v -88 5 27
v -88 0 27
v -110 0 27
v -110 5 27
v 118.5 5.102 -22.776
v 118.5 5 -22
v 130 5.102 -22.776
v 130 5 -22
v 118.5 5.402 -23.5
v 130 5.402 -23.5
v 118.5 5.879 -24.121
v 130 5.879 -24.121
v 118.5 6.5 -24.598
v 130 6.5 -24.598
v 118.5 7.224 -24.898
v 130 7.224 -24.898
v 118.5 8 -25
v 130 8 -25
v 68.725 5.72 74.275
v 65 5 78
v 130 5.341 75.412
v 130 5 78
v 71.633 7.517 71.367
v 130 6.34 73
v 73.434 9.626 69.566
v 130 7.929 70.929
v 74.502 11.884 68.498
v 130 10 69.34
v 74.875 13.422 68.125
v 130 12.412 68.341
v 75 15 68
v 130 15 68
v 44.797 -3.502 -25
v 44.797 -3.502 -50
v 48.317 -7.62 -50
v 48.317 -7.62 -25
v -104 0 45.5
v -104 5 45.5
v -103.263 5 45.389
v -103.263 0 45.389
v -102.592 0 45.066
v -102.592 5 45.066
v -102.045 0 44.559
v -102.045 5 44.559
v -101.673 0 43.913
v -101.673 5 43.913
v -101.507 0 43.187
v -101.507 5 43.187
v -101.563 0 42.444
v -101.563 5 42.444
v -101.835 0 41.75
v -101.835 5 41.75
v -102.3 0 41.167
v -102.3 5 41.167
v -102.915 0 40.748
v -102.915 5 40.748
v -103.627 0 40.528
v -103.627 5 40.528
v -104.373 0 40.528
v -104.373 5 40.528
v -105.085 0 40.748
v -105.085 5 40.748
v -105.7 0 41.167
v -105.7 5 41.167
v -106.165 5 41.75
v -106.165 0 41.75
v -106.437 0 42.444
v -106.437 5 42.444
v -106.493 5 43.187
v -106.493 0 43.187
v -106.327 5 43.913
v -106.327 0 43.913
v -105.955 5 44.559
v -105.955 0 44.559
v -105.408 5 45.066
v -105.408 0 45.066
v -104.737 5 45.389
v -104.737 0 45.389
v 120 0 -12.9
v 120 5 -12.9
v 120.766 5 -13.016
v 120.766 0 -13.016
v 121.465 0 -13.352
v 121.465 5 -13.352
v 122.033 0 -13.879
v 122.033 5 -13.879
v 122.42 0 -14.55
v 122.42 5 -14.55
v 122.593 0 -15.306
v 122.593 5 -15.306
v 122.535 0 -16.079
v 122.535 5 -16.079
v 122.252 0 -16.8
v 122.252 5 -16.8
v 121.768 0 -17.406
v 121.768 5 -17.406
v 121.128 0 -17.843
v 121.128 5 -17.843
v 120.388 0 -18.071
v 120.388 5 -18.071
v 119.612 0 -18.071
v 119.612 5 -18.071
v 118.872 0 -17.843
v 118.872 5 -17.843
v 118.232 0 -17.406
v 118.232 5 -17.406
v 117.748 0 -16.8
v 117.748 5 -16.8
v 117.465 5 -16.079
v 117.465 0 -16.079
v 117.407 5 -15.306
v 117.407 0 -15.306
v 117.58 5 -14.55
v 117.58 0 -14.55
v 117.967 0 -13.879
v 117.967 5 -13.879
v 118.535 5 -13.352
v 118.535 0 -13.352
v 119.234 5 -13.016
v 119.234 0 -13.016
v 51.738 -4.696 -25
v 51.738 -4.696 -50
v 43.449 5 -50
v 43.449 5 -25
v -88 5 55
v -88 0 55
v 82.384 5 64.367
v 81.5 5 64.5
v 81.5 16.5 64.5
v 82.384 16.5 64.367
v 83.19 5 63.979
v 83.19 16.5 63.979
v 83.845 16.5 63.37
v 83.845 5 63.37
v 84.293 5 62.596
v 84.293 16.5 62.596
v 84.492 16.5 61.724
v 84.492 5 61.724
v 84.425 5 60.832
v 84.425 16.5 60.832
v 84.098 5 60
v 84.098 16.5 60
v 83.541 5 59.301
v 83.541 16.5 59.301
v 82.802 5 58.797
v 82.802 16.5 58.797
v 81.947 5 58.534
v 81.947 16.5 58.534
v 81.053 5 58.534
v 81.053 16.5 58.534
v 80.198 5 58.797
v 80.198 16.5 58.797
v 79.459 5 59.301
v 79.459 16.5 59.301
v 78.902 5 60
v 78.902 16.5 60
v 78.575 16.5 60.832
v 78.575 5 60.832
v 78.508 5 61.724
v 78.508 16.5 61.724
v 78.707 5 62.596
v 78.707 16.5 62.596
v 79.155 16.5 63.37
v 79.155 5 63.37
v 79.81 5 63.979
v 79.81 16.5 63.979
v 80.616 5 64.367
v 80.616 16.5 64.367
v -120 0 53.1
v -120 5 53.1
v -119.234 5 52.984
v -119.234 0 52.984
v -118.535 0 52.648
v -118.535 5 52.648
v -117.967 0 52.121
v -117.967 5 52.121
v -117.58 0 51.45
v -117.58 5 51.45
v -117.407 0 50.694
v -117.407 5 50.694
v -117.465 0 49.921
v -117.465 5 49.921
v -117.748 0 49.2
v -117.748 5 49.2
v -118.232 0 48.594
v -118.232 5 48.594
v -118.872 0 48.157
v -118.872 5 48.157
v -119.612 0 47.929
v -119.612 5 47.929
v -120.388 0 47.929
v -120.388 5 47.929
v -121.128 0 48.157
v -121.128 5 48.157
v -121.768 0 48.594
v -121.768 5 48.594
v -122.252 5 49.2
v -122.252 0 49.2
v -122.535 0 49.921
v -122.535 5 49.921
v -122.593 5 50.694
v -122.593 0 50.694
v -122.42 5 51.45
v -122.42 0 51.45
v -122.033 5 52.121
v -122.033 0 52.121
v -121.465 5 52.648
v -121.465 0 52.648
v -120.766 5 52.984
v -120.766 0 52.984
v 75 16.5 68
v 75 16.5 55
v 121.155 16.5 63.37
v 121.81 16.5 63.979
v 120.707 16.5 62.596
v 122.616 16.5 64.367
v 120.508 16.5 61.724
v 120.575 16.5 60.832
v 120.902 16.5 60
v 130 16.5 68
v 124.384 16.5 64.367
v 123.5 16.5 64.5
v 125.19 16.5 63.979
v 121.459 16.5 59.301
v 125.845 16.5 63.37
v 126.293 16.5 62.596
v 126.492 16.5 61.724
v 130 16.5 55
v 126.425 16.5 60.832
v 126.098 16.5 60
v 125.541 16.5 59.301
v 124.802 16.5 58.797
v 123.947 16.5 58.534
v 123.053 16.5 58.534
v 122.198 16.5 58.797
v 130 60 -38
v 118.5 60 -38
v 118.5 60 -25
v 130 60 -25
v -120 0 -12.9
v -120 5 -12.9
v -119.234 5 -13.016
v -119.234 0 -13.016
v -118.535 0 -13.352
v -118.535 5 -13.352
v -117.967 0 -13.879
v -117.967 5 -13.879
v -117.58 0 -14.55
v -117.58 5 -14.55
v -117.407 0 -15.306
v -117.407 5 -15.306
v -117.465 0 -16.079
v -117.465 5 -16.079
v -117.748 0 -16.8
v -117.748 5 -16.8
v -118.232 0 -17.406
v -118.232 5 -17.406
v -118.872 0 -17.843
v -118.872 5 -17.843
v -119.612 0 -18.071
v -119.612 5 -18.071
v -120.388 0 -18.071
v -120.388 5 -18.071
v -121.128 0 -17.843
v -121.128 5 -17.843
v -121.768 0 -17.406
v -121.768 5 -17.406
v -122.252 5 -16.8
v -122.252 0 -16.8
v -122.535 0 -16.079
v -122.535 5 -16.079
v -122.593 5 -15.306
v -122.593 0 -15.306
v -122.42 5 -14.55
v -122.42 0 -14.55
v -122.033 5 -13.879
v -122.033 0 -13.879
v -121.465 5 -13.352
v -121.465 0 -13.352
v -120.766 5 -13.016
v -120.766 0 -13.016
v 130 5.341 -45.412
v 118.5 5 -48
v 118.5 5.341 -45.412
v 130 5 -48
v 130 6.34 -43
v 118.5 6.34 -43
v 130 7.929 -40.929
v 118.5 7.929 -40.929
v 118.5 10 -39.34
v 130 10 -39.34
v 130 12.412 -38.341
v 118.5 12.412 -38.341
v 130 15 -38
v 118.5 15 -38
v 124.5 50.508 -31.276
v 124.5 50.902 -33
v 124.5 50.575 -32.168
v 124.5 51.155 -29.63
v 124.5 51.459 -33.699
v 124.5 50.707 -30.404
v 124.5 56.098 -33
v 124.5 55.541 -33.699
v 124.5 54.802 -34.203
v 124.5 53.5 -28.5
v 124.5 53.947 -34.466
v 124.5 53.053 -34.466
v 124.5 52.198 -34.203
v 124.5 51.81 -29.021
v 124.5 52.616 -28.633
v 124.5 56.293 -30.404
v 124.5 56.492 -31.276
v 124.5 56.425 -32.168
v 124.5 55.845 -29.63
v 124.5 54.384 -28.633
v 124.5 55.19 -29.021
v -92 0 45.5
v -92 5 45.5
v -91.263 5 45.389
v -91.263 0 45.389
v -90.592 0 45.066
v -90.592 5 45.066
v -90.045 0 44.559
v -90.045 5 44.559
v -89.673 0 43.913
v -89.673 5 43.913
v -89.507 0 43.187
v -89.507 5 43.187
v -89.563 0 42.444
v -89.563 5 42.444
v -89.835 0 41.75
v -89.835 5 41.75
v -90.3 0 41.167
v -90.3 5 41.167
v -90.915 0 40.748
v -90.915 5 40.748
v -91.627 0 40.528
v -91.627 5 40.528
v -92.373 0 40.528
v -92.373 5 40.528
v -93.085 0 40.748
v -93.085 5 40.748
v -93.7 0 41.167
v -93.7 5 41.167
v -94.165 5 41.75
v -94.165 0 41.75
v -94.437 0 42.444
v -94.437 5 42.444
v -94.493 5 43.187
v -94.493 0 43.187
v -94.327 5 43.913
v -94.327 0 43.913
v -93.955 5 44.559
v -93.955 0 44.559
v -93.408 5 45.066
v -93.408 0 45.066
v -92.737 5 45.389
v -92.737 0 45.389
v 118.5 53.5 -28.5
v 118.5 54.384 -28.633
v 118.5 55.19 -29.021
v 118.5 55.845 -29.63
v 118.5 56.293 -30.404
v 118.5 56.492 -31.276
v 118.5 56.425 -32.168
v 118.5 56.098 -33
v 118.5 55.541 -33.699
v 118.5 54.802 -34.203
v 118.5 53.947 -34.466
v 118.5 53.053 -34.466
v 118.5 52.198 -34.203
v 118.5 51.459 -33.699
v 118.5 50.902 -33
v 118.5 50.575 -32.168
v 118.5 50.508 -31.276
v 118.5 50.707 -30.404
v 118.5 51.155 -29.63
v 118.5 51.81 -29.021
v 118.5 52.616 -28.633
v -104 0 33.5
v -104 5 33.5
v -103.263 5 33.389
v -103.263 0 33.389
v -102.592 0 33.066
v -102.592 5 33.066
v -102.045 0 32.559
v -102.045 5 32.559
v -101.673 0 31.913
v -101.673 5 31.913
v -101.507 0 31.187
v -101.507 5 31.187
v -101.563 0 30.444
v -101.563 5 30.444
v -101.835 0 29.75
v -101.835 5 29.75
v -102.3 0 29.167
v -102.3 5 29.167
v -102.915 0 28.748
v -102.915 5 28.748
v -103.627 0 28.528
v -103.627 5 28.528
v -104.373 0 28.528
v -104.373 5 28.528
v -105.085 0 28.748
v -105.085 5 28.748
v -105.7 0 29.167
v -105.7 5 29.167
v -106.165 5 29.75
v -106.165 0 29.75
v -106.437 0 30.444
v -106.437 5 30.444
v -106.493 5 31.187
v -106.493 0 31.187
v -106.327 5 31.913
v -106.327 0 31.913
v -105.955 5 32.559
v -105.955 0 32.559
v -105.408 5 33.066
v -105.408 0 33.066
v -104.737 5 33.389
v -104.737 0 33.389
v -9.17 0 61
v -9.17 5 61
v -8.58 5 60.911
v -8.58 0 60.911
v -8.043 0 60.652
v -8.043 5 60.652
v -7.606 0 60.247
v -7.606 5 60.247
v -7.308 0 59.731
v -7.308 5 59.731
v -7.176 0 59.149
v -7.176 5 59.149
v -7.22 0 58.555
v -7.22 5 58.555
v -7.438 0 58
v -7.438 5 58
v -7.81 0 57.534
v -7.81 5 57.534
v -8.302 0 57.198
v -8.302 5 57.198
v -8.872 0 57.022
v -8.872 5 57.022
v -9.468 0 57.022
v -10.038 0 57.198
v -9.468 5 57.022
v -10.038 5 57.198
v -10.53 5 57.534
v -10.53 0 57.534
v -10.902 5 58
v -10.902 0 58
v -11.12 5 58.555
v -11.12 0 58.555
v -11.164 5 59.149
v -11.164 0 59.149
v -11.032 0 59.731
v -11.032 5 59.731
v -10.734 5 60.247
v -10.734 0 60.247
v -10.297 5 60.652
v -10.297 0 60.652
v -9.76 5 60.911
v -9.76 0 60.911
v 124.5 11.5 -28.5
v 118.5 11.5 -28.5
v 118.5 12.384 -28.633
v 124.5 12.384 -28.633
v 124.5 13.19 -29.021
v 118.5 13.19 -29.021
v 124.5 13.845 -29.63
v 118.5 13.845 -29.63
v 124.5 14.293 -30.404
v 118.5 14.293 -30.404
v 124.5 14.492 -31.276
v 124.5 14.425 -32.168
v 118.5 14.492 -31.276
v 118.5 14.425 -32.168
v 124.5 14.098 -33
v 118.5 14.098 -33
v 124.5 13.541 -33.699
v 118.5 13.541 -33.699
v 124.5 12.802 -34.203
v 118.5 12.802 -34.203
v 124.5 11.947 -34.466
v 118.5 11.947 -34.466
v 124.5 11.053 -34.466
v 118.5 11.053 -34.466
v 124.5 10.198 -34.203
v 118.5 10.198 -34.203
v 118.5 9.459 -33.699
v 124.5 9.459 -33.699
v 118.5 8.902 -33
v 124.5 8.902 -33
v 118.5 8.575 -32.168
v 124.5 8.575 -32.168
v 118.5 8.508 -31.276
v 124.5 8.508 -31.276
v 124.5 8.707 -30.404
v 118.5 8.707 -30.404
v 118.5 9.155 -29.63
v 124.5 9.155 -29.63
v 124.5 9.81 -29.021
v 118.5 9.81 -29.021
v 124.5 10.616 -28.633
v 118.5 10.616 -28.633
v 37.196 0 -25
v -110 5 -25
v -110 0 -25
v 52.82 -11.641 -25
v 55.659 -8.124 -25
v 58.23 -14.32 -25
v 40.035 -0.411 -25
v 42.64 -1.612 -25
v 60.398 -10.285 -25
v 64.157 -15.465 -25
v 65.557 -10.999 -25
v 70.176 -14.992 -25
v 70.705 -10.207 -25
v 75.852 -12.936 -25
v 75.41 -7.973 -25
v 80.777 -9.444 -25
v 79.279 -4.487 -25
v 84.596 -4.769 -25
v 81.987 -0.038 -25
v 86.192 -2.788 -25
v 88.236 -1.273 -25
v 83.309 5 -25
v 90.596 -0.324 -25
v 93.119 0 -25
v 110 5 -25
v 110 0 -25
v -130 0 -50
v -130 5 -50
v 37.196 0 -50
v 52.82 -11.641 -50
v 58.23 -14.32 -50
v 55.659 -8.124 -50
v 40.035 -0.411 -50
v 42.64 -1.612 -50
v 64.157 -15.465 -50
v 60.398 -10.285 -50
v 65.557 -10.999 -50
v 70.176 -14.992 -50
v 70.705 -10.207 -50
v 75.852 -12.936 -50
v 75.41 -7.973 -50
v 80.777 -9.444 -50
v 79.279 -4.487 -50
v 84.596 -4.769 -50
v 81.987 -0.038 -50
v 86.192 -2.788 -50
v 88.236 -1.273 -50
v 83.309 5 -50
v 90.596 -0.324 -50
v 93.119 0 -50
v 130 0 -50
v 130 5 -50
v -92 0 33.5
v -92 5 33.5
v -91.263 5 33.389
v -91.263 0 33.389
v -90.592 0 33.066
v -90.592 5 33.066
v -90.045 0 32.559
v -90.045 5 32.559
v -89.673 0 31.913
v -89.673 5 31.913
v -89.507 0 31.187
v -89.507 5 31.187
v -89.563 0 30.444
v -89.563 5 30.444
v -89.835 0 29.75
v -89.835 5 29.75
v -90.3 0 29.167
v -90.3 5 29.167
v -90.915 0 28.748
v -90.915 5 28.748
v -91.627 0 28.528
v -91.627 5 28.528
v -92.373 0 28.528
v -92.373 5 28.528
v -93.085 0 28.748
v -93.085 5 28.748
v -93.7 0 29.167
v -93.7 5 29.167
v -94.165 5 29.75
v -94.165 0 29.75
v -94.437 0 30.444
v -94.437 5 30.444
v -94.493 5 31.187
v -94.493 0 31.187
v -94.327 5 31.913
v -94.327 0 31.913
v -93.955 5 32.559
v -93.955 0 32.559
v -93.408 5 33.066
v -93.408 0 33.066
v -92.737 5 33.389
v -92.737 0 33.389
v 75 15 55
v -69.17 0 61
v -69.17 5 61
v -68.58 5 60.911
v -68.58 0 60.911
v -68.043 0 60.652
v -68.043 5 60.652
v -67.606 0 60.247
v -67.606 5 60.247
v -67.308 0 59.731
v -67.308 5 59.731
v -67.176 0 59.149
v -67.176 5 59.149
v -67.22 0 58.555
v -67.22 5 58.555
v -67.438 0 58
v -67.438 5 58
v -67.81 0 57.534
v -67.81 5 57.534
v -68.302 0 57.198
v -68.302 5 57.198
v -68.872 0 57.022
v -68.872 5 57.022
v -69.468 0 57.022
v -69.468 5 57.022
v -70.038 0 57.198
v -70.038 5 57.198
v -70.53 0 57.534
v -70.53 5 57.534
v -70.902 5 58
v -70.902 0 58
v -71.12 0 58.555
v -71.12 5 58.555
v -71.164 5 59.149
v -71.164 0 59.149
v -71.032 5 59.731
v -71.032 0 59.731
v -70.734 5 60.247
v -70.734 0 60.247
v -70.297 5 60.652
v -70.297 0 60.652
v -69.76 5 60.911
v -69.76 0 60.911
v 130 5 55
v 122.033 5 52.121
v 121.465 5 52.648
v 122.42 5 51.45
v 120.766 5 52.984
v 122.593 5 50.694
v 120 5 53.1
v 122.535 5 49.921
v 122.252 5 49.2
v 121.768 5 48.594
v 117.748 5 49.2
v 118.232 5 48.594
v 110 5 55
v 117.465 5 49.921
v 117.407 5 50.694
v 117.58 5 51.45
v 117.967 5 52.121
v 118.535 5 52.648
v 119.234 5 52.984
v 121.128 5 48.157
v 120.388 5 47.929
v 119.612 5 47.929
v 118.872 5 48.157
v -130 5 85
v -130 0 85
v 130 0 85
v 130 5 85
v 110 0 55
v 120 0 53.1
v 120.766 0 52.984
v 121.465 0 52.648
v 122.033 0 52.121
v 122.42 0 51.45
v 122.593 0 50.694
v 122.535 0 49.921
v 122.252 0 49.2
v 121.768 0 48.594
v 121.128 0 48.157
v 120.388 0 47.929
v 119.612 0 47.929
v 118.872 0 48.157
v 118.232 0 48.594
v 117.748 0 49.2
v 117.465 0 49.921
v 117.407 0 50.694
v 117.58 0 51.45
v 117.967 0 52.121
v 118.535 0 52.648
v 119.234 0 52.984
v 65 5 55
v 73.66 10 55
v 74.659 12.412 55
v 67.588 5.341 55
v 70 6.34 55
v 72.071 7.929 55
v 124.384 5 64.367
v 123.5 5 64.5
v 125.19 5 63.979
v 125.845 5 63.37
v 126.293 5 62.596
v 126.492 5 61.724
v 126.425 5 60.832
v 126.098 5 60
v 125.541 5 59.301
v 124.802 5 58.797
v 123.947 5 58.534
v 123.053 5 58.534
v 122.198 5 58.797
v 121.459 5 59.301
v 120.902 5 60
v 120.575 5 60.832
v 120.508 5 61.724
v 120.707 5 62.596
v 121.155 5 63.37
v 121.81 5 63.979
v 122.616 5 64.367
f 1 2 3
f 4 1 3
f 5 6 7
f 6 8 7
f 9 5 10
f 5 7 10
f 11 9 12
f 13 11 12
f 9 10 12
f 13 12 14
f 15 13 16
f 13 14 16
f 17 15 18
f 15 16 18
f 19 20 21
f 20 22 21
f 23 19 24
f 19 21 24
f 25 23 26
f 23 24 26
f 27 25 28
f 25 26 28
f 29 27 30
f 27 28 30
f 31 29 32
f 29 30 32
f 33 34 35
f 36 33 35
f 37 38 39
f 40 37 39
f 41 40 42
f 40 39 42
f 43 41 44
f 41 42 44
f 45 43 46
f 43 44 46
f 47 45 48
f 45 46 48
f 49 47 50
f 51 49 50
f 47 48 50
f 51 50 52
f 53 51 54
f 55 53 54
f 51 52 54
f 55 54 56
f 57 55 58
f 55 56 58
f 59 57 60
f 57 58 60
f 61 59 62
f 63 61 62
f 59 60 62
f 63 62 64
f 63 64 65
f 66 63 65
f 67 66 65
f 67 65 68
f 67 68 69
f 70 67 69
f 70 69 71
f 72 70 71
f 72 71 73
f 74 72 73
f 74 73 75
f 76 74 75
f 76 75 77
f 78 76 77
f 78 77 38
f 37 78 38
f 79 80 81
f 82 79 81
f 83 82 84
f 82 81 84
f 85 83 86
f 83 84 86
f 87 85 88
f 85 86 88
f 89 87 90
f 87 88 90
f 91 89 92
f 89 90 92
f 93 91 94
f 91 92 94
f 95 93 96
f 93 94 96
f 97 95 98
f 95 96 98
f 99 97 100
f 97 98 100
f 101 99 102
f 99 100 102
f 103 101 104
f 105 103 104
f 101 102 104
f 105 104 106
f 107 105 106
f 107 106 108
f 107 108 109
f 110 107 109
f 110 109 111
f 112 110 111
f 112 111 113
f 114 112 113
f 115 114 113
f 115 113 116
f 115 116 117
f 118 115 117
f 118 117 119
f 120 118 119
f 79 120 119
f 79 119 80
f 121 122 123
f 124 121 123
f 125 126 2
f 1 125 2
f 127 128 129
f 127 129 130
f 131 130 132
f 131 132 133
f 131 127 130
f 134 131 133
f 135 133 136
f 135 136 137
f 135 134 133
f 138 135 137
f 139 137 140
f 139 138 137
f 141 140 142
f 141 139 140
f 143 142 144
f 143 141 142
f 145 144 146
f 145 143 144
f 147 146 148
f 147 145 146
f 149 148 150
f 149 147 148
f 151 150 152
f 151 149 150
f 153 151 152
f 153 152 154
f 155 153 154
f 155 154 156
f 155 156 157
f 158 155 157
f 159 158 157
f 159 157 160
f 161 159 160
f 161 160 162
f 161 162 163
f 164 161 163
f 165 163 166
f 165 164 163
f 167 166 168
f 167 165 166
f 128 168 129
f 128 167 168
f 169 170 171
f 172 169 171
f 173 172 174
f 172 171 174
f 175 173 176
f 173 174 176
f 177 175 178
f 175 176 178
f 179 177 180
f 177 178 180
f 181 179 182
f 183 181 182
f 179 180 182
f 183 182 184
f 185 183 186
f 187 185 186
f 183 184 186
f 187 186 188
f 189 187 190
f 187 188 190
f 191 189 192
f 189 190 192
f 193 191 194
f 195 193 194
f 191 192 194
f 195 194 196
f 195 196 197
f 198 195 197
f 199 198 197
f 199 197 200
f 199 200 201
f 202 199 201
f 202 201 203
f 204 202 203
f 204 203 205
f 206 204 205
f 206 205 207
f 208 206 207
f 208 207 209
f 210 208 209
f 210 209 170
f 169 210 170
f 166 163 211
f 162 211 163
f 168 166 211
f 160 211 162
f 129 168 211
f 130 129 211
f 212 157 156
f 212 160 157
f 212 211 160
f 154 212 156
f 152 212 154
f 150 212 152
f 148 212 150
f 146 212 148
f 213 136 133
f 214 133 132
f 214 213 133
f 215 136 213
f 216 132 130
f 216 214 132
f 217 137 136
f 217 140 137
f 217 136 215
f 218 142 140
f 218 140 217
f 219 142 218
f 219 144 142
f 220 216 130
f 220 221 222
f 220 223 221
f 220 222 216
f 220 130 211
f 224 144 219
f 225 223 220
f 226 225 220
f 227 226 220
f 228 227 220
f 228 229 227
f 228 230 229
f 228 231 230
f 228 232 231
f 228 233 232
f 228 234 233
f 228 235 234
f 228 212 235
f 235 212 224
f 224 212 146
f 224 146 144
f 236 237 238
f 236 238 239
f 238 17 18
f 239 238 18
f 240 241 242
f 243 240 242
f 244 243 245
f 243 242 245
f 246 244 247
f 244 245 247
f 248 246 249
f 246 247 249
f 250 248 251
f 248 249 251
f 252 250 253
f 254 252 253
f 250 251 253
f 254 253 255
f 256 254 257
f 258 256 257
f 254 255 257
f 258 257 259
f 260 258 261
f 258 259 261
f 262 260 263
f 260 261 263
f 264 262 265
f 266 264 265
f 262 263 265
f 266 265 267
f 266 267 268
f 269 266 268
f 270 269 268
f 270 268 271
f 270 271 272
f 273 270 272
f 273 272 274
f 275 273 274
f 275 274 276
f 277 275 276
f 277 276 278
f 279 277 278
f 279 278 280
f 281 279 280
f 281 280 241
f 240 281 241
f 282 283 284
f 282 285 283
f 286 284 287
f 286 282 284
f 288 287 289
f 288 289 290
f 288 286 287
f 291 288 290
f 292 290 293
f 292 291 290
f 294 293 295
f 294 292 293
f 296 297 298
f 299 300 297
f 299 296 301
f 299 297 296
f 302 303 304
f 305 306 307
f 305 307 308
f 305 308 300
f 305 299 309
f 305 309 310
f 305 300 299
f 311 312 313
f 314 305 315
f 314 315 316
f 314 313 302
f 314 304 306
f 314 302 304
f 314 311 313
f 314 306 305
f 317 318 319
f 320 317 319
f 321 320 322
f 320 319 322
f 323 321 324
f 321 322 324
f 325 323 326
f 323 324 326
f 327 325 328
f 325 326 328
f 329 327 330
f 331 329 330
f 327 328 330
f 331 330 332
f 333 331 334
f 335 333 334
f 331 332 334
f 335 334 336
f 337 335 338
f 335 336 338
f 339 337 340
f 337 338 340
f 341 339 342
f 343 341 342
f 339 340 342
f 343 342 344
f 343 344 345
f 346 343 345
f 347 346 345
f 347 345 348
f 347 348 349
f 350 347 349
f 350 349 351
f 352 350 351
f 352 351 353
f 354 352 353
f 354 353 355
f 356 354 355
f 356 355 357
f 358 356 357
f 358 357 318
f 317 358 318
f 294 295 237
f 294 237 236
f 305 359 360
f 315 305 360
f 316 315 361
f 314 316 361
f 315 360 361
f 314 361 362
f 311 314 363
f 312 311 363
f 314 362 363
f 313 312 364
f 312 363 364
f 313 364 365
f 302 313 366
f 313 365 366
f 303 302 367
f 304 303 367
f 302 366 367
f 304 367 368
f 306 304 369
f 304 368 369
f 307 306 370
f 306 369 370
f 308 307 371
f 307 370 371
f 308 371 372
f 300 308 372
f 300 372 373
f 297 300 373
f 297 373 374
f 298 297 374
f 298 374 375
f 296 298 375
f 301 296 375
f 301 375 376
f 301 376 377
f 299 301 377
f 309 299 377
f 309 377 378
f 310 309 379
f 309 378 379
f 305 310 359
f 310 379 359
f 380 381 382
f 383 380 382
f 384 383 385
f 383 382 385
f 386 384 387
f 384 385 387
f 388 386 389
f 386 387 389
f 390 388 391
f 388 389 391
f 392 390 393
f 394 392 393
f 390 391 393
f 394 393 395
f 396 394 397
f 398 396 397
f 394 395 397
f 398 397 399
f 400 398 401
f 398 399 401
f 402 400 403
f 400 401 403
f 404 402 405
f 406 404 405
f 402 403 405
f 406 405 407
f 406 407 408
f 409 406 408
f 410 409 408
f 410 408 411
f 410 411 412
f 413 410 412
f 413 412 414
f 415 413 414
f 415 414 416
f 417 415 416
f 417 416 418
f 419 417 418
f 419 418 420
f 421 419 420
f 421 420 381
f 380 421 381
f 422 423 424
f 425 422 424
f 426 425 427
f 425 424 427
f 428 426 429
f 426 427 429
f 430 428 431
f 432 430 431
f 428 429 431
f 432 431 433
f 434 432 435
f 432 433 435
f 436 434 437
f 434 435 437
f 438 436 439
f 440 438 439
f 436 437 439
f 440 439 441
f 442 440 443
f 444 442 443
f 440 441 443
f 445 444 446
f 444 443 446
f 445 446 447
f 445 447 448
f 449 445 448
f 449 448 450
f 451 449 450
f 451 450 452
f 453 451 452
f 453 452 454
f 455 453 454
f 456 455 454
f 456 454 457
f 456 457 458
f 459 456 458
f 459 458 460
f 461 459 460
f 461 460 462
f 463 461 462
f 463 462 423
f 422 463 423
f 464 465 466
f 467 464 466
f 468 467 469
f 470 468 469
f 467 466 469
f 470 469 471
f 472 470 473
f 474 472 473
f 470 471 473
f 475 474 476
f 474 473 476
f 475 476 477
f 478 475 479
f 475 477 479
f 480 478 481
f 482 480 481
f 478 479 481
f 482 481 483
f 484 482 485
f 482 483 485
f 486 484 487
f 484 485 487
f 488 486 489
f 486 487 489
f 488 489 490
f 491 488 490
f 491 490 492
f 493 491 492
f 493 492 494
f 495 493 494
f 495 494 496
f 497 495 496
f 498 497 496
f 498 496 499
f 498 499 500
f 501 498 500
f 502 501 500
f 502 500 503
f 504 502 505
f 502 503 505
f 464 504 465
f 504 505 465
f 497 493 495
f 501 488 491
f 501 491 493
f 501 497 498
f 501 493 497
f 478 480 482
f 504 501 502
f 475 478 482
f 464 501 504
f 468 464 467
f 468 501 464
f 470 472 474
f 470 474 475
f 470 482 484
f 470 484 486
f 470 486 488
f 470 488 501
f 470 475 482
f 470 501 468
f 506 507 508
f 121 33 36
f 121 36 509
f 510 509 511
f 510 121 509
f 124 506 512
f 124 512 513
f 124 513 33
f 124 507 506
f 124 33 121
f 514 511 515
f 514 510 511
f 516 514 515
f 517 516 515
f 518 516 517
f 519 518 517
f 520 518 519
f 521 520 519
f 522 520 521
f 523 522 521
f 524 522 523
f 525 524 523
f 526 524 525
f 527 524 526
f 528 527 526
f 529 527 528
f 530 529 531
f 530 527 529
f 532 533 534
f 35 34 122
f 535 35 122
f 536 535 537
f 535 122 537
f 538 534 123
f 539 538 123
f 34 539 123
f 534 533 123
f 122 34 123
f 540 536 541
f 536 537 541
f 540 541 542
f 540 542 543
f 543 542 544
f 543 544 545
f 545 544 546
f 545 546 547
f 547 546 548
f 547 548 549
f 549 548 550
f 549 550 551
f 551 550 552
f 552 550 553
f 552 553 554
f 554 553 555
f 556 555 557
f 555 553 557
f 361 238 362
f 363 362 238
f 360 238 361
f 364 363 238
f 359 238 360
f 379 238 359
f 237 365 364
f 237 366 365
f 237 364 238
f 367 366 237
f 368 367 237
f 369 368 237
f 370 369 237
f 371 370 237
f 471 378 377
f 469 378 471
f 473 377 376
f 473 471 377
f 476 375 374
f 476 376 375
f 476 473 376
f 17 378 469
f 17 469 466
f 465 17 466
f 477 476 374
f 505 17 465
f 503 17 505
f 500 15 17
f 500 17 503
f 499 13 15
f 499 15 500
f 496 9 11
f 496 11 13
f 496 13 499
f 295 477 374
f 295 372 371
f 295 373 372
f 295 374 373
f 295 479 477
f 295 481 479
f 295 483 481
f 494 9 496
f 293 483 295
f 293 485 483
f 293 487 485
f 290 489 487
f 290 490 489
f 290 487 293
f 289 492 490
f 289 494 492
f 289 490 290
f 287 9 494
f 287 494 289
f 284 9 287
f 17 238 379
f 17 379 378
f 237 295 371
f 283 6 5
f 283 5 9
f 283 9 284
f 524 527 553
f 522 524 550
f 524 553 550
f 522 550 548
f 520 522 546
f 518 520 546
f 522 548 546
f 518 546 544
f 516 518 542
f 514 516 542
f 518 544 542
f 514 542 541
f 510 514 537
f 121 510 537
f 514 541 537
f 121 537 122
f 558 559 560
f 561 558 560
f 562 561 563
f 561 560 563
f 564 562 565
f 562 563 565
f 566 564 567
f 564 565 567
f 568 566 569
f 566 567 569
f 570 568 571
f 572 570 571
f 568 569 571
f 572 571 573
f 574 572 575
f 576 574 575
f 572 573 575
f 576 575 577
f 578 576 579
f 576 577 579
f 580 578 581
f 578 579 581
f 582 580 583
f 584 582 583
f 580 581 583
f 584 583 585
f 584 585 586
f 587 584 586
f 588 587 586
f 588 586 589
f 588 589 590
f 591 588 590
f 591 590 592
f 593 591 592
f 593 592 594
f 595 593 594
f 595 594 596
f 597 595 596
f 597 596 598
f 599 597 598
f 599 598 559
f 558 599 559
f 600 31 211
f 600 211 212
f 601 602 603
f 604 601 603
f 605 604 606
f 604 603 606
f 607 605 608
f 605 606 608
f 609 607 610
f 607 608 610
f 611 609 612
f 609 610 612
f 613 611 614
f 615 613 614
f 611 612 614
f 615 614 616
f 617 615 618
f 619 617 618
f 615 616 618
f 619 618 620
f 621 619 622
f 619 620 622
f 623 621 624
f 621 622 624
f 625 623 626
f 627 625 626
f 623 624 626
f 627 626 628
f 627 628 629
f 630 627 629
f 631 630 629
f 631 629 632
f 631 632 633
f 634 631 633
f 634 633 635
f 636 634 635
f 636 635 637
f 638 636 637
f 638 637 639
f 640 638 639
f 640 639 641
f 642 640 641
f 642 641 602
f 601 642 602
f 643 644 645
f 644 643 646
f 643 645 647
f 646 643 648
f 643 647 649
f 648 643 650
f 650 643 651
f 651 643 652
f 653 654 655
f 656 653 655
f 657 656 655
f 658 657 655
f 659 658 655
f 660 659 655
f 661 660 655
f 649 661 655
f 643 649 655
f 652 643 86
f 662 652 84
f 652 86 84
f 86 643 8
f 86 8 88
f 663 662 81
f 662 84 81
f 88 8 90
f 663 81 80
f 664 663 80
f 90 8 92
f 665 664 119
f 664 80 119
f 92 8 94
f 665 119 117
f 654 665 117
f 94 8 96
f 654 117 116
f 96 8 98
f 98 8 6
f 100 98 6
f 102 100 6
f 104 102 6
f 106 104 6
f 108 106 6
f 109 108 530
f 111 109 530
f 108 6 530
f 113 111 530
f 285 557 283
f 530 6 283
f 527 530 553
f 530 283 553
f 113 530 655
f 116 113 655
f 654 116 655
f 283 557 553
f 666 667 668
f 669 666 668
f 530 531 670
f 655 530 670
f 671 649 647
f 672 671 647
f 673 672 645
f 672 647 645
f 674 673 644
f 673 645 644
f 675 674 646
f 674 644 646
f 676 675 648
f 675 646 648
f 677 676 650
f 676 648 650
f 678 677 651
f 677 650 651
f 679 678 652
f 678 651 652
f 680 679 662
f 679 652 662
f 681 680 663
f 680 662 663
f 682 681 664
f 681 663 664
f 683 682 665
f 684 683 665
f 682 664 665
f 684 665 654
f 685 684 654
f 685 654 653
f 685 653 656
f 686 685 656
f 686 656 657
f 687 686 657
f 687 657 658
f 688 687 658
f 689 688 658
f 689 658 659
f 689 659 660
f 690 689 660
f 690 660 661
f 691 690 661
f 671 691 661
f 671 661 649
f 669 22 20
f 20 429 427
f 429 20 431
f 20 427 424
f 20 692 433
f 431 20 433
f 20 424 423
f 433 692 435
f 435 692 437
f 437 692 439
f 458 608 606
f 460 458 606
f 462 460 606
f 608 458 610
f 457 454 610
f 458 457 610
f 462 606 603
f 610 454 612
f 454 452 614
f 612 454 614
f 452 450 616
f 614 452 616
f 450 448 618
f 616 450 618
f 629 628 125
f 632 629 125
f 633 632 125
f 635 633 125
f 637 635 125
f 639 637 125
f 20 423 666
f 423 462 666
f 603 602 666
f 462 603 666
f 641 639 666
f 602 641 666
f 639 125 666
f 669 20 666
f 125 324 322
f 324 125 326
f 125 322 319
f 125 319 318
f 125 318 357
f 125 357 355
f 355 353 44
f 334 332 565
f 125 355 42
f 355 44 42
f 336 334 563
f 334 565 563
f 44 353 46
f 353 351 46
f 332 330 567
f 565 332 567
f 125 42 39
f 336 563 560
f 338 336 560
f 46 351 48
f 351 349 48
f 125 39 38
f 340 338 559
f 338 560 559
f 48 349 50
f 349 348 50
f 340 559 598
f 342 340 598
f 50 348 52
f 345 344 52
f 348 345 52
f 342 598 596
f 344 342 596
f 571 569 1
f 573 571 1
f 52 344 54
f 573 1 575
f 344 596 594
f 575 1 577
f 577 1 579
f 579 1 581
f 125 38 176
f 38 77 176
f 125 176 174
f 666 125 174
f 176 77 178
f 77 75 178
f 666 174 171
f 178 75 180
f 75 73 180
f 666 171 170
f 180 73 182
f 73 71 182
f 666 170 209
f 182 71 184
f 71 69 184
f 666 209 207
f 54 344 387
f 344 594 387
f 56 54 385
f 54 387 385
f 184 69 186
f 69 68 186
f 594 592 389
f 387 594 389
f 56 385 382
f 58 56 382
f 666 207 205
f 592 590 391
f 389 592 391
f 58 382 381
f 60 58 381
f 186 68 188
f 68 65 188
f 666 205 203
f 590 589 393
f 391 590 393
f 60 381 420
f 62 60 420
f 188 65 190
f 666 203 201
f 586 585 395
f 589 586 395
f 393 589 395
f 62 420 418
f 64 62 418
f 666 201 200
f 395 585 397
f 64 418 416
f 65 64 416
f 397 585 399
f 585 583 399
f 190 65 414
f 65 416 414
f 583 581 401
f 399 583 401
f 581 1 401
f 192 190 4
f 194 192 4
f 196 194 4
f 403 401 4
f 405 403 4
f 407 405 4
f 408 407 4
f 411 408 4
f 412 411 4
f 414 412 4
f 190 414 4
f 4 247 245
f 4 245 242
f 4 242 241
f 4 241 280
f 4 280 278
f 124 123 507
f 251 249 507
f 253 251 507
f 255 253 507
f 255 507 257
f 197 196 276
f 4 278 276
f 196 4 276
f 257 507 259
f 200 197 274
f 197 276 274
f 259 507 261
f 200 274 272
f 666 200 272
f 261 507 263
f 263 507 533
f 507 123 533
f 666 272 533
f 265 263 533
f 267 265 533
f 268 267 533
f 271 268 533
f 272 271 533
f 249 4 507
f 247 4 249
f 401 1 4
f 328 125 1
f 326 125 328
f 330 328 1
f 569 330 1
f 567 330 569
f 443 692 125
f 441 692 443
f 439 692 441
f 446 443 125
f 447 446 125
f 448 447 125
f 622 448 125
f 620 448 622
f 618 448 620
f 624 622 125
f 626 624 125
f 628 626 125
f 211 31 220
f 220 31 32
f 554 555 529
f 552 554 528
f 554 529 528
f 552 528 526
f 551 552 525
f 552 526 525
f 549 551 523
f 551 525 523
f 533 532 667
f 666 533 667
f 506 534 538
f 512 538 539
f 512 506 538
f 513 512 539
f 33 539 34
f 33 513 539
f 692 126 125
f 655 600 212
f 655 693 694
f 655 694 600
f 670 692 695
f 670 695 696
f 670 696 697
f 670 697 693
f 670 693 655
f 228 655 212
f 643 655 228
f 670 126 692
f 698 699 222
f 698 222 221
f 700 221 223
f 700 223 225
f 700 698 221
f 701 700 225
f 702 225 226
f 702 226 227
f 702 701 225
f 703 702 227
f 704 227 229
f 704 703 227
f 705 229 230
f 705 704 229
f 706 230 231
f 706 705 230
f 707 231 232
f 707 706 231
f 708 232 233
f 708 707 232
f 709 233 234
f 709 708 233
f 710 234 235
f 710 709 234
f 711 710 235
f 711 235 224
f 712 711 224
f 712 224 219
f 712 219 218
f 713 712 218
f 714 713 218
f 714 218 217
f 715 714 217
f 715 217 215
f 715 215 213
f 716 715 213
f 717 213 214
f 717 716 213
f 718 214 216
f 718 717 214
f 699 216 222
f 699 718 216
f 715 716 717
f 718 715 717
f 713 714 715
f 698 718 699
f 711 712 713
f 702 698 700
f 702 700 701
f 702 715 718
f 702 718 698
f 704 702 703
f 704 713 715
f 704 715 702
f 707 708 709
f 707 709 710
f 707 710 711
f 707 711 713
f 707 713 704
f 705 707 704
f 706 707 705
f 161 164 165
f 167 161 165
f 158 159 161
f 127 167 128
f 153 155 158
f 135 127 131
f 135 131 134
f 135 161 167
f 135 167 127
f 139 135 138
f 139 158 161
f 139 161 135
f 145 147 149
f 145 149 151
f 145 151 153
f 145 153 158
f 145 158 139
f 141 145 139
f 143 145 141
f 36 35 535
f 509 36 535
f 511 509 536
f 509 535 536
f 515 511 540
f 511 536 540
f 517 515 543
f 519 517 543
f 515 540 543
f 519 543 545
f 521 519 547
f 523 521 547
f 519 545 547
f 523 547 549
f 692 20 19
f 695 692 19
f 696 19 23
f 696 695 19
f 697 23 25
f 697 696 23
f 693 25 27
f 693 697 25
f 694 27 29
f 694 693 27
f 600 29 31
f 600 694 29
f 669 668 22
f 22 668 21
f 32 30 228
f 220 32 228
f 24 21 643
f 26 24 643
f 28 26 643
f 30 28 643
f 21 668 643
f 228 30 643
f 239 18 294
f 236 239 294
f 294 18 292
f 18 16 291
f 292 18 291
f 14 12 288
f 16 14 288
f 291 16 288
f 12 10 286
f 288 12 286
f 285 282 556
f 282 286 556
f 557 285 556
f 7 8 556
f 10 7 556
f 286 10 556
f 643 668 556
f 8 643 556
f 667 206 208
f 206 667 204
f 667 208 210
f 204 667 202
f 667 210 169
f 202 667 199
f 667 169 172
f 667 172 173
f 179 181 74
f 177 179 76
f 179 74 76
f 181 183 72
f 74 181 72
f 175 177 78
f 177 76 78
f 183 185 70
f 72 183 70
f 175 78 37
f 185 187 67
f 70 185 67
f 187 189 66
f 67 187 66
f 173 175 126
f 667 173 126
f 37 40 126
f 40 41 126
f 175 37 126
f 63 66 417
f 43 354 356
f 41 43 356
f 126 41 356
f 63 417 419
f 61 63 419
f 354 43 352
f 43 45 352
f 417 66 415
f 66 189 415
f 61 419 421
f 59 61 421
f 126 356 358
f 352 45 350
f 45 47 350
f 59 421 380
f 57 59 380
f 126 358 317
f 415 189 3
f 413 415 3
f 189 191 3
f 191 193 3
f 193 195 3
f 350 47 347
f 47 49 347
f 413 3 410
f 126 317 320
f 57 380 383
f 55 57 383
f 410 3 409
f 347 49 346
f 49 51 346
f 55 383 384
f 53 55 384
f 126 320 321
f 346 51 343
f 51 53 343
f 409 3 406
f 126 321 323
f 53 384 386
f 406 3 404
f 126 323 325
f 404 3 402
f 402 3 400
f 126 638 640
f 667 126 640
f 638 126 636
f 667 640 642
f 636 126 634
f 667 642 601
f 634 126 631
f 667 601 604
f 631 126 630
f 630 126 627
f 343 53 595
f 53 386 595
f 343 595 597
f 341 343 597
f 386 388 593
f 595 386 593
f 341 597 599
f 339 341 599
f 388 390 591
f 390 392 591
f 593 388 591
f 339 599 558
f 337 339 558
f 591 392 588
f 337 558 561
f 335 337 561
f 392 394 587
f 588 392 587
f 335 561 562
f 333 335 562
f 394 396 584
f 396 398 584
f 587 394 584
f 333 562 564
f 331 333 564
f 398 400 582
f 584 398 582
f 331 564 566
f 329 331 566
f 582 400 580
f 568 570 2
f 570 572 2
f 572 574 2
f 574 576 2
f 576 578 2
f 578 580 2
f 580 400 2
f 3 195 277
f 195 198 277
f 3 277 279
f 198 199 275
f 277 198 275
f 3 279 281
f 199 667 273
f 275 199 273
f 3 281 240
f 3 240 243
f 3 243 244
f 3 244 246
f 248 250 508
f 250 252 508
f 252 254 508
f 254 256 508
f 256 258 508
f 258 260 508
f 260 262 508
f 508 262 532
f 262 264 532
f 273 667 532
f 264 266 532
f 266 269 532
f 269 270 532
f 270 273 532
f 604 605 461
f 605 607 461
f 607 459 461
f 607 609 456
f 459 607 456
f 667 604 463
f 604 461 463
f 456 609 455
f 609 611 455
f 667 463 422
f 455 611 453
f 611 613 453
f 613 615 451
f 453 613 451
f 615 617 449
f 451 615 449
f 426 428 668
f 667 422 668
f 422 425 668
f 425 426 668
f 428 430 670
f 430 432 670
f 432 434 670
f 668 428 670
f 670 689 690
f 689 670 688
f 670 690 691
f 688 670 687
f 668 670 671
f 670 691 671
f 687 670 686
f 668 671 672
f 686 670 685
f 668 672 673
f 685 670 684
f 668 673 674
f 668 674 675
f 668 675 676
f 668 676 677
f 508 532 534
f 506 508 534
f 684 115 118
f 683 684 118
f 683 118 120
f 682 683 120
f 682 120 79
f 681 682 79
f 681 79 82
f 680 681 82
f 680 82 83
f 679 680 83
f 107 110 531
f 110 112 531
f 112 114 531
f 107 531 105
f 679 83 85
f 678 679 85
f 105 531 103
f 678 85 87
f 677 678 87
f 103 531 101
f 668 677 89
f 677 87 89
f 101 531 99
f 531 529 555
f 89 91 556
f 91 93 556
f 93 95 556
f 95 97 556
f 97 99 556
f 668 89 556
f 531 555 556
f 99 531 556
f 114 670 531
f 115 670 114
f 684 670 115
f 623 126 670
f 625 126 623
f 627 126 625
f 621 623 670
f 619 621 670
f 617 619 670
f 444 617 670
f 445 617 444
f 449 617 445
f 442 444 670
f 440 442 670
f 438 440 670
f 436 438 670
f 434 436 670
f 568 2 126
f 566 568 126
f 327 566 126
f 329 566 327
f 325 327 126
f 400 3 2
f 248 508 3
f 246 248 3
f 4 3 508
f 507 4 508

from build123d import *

# Parameters (mm, degrees)
BOSS_EXTRUDE1_DEPTH = 5
SKETCH2_W           = 55
SKETCH2_H           = 13
SKETCH2_R           = 3
BOSS_EXTRUDE2_DEPTH = 11.5
SKETCH3_W           = 11.5
SKETCH3_H           = 13
BOSS_EXTRUDE3_DEPTH = 55
BOSS_EXTRUDE4_DEPTH = 60
CUT_EXTRUDE1_DEPTH  = 35
SKETCH6_R           = 2.5
SKETCH6_R_2         = 2
CUT_EXTRUDE2_DEPTH  = 10
SKETCH7_R           = 2.6
CUT_EXTRUDE3_DEPTH  = 10
SKETCH8_R           = 3
CUT_EXTRUDE4_DEPTH  = 6
FILLET1_R           = 10
FILLET2_R           = 3
FILLET3_R           = 10


with BuildPart() as part:
    # Sketch1 → Boss-Extrude1 (new body)
    with BuildSketch(Plane(origin=(0, 0, 0), x_dir=(1, 0, 0), z_dir=(0, 1, 0))):
        Polygon((130, 85), (90, 85), (90, 25), (110, 25), (110, -55), (-88, -55), (-88, -27), (-110, -27), (-110, 85), (-130, 85), (-130, -85), (130, -85), align=None)
    extrude(amount=BOSS_EXTRUDE1_DEPTH)

    # Sketch2 → Boss-Extrude2 (add)
    with BuildSketch(Plane(origin=(0, 5, 0), x_dir=(1, 0, 0), z_dir=(0, 1, 0))):
        with Locations((102.5, -61.5)):
            Rectangle(SKETCH2_W, SKETCH2_H)
        with Locations((81.5, -61.5)):
            Circle(SKETCH2_R, mode=Mode.SUBTRACT)
        with Locations((123.5, -61.5)):
            Circle(SKETCH2_R, mode=Mode.SUBTRACT)
    extrude(amount=BOSS_EXTRUDE2_DEPTH)

    # Sketch3 → Boss-Extrude3 (add)
    with BuildSketch(Plane(origin=(0, 5, 0), x_dir=(1, 0, 0), z_dir=(0, 1, 0))):
        with Locations((124.25, 31.5)):
            Rectangle(SKETCH3_W, SKETCH3_H)
    extrude(amount=BOSS_EXTRUDE3_DEPTH)

    # Sketch4 → Boss-Extrude4 (add)
    with BuildSketch(Plane(origin=(0, 0, -85), x_dir=(-1, 0, 0), z_dir=(0, 0, -1))):
        with BuildLine():
            Line((-90, 5), (-83.30854382, 5))
            ThreePointArc((-83.30854382, 5), (-70.704531681, -10.206792987), (-51.737752976, -4.695987191))
            Line((-51.737752976, -4.695987191), (-43.449337938, 5))
            Line((-43.449337938, 5), (110, 5))
            Line((110, 5), (130, 5))
            Line((130, 5), (130, 0))
            Line((130, 0), (110, 0))
            Line((110, 0), (-41.80340478, 0))
            Line((-41.80340478, 0), (-48.31719122, -7.619983989))
            ThreePointArc((-48.31719122, -7.619983989), (-69.790001662, -15.071544701), (-86.80340478, 0))
            Line((-86.80340478, 0), (-90, 0))
            Line((-90, 0), (-130, 0))
            Line((-130, 0), (-130, 5))
            Line((-130, 5), (-90, 5))
        make_face()
    extrude(amount=-BOSS_EXTRUDE4_DEPTH)

    # Sketch5 → Cut-Extrude1 (cut)
    with BuildSketch(Plane(origin=(0, 0, -85), x_dir=(-1, 0, 0), z_dir=(0, 0, -1))):
        with BuildLine():
            Line((130, 5), (130, 0))
            Line((130, 0), (-41.80340478, 0))
            Line((-41.80340478, 0), (-48.31719122, -7.619983989))
            ThreePointArc((-48.31719122, -7.619983989), (-69.790001662, -15.071544701), (-86.80340478, 0))
            Line((-86.80340478, 0), (-130, 0))
            Line((-130, 0), (-130, 5))
            Line((-130, 5), (-83.30854382, 5))
            ThreePointArc((-83.30854382, 5), (-70.704531681, -10.206792987), (-51.737752976, -4.695987191))
            Line((-51.737752976, -4.695987191), (-43.449337938, 5))
            Line((-43.449337938, 5), (130, 5))
        make_face()
    extrude(amount=-CUT_EXTRUDE1_DEPTH, mode=Mode.SUBTRACT)

    # Sketch6 → Cut-Extrude2 (cut)
    with BuildSketch(Plane(origin=(0, 5, 0), x_dir=(1, 0, 0), z_dir=(0, 1, 0))):
        with Locations((-104, -31)):
            Circle(SKETCH6_R)
        with Locations((-92, -31)):
            Circle(SKETCH6_R)
        with Locations((-92, -43)):
            Circle(SKETCH6_R)
        with Locations((-104, -43)):
            Circle(SKETCH6_R)
        with Locations((-9.17, -59)):
            Circle(SKETCH6_R_2)
        with Locations((-69.17, -59)):
            Circle(SKETCH6_R_2)
    extrude(amount=-CUT_EXTRUDE2_DEPTH, mode=Mode.SUBTRACT)

    # Sketch7 → Cut-Extrude3 (cut)
    with BuildSketch(Plane(origin=(0, 5, 0), x_dir=(1, 0, 0), z_dir=(0, 1, 0))):
        with Locations((120, 15.5)):
            Circle(SKETCH7_R)
        with Locations((120, -50.5)):
            Circle(SKETCH7_R)
        with Locations((-120, -50.5)):
            Circle(SKETCH7_R)
        with Locations((-120, 15.5)):
            Circle(SKETCH7_R)
    extrude(amount=-CUT_EXTRUDE3_DEPTH, mode=Mode.SUBTRACT)

    # Sketch8 → Cut-Extrude4 (cut)
    with BuildSketch(Plane.ZY.offset(-118.5)):
        with Locations((-31.5, 53.5)):
            Circle(SKETCH8_R)
        with Locations((-31.5, 11.5)):
            Circle(SKETCH8_R)
    extrude(amount=-CUT_EXTRUDE4_DEPTH, mode=Mode.SUBTRACT)

    # Fillet1
    fillet1_edges = [part.edges().sort_by_distance(p)[0] for p in [
        (124.25, 5, -38),
        (75, 5, 61.5),
        (102.5, 5, 68),
    ]]
    fillet(fillet1_edges, radius=FILLET1_R)

    # Fillet2
    fillet2_edges = [part.edges().sort_by_distance(p)[0] for p in [
        (124.25, 5, -25),
    ]]
    fillet(fillet2_edges, radius=FILLET2_R)

    # Fillet3
    fillet3_edges = [part.edges().sort_by_distance(p)[0] for p in [
        (41.80340478, 0, -37.5),
        (86.80340478, 0, -37.5),
    ]]
    fillet(fillet3_edges, radius=FILLET3_R)


solid = part.part
